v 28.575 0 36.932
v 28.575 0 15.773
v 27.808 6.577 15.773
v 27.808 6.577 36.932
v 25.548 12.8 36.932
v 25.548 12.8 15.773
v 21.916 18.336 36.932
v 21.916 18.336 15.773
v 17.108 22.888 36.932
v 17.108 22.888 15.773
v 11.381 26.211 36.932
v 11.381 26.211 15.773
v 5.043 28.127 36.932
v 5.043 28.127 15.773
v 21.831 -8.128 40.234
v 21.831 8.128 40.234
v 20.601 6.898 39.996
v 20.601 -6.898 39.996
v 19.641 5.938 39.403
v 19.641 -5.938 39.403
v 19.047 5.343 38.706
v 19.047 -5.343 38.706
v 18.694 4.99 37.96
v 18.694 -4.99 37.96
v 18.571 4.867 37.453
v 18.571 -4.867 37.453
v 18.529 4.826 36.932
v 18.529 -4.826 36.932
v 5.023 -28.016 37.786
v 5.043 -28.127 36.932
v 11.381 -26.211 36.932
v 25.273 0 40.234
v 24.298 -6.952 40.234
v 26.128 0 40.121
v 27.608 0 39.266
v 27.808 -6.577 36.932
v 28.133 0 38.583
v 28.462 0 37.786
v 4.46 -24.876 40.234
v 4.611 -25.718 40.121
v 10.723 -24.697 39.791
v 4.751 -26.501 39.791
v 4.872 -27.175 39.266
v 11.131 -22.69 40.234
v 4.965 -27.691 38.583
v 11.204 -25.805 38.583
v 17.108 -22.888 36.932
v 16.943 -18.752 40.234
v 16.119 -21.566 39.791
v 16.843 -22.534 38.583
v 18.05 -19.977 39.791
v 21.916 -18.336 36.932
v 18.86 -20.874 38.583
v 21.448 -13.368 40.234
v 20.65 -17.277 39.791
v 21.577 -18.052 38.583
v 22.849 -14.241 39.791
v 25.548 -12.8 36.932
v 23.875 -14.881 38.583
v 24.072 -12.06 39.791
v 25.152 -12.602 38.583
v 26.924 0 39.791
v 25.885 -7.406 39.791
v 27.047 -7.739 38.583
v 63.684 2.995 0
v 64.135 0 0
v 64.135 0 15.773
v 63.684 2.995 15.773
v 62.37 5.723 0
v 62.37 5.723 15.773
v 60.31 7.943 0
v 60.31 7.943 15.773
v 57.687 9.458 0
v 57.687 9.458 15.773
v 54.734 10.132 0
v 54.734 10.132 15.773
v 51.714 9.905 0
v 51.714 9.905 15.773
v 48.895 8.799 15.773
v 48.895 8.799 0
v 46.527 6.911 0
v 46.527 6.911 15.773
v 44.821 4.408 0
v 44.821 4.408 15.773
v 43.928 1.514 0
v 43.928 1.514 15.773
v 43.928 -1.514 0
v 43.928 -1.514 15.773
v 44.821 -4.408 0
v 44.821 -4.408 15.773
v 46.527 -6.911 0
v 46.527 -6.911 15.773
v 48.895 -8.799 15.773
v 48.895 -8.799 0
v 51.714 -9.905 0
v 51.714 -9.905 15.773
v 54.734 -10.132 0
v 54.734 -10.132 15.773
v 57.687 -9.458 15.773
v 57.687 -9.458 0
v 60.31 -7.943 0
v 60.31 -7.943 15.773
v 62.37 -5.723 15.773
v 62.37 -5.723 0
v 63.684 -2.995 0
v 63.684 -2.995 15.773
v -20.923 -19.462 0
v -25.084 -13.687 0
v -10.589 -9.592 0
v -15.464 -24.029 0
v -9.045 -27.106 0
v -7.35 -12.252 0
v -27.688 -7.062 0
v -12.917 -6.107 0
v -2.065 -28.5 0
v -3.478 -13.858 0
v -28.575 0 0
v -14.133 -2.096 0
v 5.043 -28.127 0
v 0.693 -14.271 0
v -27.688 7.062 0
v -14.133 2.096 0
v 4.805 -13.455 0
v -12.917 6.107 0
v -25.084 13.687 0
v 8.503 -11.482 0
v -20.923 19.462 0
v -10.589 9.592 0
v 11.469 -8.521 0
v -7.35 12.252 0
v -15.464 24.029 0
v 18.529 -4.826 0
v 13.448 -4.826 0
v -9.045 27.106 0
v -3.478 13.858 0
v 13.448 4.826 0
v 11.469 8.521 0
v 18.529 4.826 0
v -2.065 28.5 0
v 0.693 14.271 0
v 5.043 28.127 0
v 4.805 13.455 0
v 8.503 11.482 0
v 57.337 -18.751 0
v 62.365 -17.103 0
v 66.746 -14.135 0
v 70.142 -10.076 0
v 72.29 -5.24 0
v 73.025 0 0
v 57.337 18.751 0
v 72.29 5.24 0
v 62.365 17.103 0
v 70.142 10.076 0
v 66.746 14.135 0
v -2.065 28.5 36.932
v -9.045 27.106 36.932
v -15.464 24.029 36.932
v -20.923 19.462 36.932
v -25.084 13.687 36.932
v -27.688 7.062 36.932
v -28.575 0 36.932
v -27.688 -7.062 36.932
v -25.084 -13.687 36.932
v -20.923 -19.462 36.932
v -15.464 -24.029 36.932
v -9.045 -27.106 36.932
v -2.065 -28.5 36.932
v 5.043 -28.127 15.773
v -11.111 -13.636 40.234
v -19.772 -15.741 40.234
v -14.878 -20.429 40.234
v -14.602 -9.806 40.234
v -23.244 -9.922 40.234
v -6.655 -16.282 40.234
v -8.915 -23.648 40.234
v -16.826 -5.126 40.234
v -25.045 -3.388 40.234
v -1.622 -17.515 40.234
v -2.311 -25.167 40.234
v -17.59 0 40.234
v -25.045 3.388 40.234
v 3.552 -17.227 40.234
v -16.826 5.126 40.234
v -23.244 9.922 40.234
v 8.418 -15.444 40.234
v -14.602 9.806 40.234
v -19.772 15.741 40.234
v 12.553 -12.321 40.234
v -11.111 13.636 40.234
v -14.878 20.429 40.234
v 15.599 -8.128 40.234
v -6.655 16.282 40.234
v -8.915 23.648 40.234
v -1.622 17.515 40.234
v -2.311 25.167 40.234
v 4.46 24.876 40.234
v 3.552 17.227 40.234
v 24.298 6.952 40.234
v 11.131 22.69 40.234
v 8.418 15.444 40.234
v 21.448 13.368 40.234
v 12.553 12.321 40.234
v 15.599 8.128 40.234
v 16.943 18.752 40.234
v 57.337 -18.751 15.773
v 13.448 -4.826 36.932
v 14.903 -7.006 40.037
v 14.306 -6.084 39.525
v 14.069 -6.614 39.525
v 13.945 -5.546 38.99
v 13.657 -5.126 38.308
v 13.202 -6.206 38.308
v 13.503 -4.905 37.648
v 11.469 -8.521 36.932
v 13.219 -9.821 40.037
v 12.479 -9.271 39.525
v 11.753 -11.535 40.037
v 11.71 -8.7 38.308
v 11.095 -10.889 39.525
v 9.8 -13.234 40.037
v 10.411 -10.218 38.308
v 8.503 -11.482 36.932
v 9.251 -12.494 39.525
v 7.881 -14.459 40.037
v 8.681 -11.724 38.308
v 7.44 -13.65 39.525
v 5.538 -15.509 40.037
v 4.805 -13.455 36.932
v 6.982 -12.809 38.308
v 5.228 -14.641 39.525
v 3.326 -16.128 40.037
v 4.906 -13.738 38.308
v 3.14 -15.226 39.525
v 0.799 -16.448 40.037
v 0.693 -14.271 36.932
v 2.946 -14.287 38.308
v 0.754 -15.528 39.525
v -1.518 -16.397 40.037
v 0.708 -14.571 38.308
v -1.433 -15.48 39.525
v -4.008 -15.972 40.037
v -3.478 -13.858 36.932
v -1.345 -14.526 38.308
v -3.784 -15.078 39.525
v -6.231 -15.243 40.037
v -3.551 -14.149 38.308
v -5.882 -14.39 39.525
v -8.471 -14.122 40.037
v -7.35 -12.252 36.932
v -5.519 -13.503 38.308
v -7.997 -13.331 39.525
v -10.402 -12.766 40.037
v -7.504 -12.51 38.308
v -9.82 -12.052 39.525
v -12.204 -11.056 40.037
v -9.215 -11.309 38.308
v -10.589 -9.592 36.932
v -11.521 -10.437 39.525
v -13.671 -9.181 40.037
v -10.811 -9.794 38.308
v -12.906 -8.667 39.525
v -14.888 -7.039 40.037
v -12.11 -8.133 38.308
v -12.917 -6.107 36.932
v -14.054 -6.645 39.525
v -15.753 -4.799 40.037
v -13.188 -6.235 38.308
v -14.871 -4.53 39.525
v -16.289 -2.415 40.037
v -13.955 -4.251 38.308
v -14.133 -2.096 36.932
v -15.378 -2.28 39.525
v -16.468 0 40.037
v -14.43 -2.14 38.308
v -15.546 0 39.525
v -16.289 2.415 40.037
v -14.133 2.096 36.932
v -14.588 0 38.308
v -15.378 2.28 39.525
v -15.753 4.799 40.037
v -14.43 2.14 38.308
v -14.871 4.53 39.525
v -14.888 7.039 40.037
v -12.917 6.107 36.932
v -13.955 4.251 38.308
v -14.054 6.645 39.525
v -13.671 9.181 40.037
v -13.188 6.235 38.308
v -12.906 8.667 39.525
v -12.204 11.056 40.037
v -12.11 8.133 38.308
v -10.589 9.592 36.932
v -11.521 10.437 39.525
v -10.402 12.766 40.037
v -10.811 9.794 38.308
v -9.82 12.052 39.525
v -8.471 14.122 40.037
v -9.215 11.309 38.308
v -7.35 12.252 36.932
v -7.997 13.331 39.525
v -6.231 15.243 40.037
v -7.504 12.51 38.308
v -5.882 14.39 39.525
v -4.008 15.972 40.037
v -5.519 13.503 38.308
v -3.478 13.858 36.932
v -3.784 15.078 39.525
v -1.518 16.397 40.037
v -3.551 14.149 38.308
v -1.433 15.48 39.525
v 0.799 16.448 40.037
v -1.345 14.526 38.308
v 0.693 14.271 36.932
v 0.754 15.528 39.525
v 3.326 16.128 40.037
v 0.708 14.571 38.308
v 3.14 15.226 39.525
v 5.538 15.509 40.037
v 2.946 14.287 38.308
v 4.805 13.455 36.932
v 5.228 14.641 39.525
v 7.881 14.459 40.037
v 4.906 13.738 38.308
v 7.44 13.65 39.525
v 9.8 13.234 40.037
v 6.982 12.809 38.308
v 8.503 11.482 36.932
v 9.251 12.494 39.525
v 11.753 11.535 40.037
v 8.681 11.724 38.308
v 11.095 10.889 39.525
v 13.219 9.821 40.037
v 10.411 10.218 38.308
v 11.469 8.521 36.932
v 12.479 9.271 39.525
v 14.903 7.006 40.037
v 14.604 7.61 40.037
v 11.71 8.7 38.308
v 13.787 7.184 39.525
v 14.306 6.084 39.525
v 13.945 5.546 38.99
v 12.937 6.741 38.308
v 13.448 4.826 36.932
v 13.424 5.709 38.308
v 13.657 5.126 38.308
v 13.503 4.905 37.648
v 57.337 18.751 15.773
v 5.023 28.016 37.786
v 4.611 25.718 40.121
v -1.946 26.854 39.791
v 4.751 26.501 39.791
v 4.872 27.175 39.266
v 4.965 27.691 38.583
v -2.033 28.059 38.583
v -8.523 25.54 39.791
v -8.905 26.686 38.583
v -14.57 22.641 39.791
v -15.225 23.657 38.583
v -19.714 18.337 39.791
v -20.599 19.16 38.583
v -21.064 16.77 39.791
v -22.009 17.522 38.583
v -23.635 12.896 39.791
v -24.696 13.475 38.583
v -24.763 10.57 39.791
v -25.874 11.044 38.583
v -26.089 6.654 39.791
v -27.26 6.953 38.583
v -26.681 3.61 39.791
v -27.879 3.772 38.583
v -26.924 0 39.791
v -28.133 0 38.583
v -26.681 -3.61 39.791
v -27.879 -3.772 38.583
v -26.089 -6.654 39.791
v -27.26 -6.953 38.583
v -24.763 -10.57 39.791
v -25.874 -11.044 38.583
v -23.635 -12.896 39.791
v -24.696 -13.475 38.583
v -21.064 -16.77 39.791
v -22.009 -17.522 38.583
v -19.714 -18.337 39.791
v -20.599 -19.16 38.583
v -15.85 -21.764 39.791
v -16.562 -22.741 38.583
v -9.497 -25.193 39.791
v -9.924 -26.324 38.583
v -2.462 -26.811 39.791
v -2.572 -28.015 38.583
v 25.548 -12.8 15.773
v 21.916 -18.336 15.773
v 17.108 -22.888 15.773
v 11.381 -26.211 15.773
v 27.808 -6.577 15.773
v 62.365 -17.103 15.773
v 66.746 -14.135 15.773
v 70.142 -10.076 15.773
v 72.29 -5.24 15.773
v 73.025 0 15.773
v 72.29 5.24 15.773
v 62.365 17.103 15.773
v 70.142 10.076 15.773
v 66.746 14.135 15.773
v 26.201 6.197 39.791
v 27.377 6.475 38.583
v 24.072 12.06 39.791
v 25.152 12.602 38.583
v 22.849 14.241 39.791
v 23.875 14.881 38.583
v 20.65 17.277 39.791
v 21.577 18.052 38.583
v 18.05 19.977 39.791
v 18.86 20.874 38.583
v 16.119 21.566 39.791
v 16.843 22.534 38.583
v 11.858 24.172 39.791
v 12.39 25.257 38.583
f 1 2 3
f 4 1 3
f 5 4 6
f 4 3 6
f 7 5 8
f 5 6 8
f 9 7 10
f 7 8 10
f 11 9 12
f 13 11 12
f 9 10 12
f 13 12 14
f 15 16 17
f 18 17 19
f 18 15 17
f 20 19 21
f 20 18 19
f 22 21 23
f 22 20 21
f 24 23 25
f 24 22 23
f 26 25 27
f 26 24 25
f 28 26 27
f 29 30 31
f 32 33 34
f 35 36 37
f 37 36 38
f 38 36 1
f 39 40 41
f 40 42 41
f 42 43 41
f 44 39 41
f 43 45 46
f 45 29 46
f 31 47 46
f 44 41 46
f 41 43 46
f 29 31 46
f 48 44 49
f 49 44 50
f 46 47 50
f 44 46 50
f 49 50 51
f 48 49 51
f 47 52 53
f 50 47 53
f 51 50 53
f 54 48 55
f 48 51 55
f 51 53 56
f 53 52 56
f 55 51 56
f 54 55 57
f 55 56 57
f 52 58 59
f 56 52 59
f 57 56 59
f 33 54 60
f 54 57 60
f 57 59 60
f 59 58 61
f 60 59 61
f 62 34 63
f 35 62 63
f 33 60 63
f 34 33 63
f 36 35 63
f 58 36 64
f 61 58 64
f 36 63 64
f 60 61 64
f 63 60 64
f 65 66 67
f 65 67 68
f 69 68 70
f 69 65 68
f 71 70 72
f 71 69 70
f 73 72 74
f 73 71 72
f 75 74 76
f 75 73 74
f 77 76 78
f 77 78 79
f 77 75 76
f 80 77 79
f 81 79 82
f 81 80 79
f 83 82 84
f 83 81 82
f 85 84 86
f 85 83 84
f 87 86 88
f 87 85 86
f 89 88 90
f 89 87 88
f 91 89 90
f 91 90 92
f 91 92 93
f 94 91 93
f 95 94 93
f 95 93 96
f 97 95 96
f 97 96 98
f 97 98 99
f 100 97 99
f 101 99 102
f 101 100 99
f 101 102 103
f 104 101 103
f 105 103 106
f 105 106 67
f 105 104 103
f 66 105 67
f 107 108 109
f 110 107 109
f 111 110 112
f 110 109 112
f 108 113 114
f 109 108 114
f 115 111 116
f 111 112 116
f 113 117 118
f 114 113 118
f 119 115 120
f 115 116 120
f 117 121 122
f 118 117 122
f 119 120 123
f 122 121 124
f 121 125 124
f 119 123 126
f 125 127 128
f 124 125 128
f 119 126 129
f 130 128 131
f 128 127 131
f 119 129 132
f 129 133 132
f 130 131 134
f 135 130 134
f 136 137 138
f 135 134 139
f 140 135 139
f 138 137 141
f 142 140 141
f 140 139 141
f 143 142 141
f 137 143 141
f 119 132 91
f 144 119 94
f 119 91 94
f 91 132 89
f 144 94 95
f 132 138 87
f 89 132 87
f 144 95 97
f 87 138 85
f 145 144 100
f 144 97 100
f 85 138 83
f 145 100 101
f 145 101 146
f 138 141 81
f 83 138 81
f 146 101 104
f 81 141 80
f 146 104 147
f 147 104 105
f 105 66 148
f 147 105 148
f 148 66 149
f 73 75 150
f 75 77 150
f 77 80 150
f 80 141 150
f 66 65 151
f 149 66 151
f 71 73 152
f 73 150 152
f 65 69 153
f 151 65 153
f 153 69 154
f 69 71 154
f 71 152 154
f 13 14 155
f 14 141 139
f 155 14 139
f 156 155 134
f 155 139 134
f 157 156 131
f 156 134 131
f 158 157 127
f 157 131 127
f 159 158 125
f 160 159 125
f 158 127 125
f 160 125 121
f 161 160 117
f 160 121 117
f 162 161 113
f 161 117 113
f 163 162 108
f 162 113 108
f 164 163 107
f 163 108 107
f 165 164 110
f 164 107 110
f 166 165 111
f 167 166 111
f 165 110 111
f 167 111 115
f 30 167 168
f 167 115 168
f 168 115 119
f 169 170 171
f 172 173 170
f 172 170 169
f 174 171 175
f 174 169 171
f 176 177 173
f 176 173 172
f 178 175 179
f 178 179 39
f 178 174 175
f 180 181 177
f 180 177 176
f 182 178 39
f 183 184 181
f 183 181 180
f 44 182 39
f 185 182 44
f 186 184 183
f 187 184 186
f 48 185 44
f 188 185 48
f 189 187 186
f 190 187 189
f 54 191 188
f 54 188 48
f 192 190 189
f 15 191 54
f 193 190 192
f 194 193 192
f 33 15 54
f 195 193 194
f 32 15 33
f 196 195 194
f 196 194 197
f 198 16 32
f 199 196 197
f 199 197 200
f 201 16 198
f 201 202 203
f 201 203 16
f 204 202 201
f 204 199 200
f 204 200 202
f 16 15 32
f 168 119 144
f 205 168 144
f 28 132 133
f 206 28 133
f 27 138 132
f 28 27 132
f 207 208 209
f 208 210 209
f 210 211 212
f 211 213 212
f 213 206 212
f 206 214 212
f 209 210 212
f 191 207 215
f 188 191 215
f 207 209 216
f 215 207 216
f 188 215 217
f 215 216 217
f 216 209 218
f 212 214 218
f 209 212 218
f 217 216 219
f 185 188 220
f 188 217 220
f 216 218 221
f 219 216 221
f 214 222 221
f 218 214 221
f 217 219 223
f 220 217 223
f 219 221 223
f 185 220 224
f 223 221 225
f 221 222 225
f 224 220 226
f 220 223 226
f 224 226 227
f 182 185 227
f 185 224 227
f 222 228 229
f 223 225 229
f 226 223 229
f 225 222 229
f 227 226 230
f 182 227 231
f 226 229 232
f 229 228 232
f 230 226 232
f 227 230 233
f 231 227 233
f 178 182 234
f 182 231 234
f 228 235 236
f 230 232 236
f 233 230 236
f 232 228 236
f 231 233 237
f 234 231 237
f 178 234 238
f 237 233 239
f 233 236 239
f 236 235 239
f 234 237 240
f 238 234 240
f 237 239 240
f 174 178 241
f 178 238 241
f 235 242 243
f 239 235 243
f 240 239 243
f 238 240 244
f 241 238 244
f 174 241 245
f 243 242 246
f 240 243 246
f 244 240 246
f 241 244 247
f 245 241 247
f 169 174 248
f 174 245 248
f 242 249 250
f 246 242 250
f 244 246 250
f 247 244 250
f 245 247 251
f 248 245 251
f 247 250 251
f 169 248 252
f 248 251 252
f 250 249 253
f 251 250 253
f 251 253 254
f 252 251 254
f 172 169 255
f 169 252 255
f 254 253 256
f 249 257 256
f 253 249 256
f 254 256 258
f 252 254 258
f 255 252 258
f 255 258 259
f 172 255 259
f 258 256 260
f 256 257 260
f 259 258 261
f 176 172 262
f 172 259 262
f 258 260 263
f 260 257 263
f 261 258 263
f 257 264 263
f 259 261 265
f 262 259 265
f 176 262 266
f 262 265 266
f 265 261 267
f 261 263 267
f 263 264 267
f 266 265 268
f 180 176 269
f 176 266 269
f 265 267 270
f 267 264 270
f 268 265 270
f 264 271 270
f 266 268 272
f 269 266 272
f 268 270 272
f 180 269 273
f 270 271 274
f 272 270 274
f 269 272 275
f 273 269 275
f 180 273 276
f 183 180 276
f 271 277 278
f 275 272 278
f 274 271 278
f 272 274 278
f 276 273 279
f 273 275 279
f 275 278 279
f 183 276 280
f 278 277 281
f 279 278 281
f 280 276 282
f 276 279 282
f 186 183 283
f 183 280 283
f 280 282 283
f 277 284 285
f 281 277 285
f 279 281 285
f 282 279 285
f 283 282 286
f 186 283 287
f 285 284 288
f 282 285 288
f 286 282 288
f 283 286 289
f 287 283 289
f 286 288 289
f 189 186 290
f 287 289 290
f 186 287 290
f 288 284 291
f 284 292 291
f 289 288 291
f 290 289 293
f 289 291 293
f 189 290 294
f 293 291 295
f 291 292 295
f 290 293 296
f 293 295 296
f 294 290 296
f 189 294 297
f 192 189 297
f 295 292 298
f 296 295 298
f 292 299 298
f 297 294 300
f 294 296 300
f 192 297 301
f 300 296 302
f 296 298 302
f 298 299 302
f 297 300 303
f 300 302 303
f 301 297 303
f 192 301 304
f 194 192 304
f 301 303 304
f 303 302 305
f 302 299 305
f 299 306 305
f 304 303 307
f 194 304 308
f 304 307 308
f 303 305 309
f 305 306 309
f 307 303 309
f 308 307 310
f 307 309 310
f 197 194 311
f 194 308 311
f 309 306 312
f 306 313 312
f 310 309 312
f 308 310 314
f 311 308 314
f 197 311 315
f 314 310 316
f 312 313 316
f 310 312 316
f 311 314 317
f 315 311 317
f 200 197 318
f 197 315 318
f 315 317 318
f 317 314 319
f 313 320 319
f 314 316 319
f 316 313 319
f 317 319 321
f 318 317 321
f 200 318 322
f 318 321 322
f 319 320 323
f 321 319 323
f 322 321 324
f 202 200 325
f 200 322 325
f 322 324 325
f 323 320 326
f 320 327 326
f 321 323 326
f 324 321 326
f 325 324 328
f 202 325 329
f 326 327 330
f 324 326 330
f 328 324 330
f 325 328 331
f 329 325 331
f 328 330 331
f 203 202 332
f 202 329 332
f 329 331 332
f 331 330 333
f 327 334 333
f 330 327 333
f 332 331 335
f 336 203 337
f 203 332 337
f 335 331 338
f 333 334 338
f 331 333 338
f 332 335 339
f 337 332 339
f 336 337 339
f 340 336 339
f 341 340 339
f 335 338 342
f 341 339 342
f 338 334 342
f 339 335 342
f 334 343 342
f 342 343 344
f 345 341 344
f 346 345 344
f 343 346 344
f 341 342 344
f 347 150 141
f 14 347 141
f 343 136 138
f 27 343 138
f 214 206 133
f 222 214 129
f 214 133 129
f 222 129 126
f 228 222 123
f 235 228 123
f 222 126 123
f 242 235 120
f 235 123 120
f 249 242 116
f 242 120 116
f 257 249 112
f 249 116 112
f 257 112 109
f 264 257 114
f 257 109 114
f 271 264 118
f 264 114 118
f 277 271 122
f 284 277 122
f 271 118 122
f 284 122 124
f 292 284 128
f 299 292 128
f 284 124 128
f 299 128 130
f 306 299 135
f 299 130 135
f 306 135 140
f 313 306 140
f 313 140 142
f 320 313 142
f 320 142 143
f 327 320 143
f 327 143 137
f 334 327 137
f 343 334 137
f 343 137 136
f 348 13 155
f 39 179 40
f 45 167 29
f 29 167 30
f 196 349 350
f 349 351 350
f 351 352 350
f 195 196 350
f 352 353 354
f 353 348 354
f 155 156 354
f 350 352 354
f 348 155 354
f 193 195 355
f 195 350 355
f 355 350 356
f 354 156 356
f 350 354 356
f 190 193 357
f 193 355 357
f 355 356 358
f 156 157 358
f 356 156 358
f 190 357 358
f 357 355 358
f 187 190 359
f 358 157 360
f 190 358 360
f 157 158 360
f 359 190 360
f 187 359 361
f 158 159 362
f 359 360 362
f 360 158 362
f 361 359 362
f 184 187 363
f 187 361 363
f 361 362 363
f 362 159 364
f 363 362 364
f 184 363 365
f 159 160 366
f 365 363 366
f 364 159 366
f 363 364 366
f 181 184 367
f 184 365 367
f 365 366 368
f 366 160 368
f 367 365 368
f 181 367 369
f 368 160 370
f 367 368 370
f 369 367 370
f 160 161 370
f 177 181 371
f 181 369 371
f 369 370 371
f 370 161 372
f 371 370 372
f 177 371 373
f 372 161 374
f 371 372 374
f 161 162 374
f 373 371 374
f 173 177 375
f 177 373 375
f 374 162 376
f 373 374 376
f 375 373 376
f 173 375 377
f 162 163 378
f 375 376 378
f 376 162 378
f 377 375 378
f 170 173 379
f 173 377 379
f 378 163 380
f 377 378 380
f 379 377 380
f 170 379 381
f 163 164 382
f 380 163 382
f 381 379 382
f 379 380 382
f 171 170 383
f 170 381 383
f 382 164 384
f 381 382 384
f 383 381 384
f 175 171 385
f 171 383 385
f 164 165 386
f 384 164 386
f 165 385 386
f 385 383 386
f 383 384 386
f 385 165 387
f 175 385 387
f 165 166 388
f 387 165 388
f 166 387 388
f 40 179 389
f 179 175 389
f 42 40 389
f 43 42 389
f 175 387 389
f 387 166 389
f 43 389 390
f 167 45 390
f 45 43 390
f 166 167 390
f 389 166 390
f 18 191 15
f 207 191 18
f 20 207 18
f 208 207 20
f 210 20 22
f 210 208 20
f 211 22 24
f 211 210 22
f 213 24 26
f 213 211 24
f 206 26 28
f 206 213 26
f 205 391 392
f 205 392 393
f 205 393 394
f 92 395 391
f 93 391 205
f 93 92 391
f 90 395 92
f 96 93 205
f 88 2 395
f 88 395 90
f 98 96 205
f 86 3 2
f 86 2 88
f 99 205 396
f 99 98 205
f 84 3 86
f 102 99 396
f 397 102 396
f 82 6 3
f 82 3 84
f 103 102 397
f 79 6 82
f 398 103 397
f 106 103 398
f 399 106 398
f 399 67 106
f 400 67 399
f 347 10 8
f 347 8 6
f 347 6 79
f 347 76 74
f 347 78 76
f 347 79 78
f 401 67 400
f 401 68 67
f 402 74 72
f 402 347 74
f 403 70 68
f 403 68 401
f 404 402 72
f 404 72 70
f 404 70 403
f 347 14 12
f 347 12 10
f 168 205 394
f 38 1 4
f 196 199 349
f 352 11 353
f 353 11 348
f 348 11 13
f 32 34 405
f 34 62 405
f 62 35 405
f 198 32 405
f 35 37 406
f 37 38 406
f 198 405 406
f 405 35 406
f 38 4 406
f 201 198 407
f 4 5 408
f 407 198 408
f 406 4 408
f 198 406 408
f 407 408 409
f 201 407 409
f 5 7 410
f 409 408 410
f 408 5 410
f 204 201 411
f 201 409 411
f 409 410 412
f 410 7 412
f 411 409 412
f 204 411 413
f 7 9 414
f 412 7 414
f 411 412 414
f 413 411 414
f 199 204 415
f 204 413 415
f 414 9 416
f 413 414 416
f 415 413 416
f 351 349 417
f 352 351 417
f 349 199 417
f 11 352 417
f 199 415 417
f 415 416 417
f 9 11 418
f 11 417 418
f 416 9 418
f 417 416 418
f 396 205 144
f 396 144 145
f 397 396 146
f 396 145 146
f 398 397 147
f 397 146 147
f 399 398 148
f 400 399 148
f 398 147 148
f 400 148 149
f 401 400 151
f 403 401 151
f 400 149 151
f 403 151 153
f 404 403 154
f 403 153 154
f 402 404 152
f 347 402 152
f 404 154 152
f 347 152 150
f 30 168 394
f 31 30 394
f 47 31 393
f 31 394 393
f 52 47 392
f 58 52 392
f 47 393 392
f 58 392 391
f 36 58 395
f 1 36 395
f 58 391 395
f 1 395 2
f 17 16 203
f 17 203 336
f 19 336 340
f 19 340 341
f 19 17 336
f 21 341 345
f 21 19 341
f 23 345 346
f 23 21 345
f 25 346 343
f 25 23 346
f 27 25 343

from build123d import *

# Parameters (mm, degrees)
F1_DEPTH = 40.2336
F0_R     = 10.16
F2_DEPTH = 15.7734
F3_R     = 3.302


with BuildPart() as f1:
    # F0 (on Top) → F1 (new body)
    with BuildSketch(Plane.XY):
        with BuildLine():
            ThreePointArc((5.042647, -28.126541), (21.916025, -18.336262), (28.575, 0))
            ThreePointArc((28.575, 0), (21.916025, 18.336262), (5.042647, 28.126541))
            ThreePointArc((5.042647, 28.126541), (-28.575, 0), (5.042647, -28.126541))
        make_face()
        with BuildLine():
            ThreePointArc((13.447765, -4.826), (-14.2875, 0), (13.447765, 4.826))
            Line((13.447765, 4.826), (18.5293, 4.826))
            Line((18.5293, 4.826), (18.5293, -4.826))
            Line((18.5293, -4.826), (13.447765, -4.826))
        make_face(mode=Mode.SUBTRACT)
    extrude(amount=F1_DEPTH)

    # F0 (on Top) → F2 (join)
    with BuildSketch(Plane.XY):
        with BuildLine():
            ThreePointArc((5.042647, -28.126541), (21.916025, -18.336262), (28.575, 0))
            ThreePointArc((28.575, 0), (21.916025, 18.336262), (5.042647, 28.126541))
            ThreePointArc((5.042647, 28.126541), (-28.575, 0), (5.042647, -28.126541))
        make_face()
        with BuildLine():
            ThreePointArc((13.447765, -4.826), (-14.2875, 0), (13.447765, 4.826))
            Line((13.447765, 4.826), (18.5293, 4.826))
            Line((18.5293, 4.826), (18.5293, -4.826))
            Line((18.5293, -4.826), (13.447765, -4.826))
        make_face(mode=Mode.SUBTRACT)
        with BuildLine():
            ThreePointArc((5.042647, 28.126541), (21.916025, 18.336262), (28.575, 0))
            ThreePointArc((28.575, 0), (21.916025, -18.336262), (5.042647, -28.126541))
            Line((5.042647, -28.126541), (57.336765, -18.751028))
            ThreePointArc((57.336765, -18.751028), (73.025, 0), (57.336765, 18.751028))
            Line((57.336765, 18.751028), (5.042647, 28.126541))
        make_face()
        with Locations((53.975, 0)):
            Circle(F0_R, mode=Mode.SUBTRACT)
    extrude(amount=F2_DEPTH)

    # F3
    f3_edges = [f1.edges().sort_by_distance(p)[0] for p in [
        (-5.042647, 28.126541, 40.2336),
        (-14.2875, 0, 40.2336),
        (15.988532, 4.826, 40.2336),
        (18.5293, 0, 40.2336),
        (15.988532, -4.826, 40.2336),
    ]]
    fillet(f3_edges, radius=F3_R)


solid = f1.part
